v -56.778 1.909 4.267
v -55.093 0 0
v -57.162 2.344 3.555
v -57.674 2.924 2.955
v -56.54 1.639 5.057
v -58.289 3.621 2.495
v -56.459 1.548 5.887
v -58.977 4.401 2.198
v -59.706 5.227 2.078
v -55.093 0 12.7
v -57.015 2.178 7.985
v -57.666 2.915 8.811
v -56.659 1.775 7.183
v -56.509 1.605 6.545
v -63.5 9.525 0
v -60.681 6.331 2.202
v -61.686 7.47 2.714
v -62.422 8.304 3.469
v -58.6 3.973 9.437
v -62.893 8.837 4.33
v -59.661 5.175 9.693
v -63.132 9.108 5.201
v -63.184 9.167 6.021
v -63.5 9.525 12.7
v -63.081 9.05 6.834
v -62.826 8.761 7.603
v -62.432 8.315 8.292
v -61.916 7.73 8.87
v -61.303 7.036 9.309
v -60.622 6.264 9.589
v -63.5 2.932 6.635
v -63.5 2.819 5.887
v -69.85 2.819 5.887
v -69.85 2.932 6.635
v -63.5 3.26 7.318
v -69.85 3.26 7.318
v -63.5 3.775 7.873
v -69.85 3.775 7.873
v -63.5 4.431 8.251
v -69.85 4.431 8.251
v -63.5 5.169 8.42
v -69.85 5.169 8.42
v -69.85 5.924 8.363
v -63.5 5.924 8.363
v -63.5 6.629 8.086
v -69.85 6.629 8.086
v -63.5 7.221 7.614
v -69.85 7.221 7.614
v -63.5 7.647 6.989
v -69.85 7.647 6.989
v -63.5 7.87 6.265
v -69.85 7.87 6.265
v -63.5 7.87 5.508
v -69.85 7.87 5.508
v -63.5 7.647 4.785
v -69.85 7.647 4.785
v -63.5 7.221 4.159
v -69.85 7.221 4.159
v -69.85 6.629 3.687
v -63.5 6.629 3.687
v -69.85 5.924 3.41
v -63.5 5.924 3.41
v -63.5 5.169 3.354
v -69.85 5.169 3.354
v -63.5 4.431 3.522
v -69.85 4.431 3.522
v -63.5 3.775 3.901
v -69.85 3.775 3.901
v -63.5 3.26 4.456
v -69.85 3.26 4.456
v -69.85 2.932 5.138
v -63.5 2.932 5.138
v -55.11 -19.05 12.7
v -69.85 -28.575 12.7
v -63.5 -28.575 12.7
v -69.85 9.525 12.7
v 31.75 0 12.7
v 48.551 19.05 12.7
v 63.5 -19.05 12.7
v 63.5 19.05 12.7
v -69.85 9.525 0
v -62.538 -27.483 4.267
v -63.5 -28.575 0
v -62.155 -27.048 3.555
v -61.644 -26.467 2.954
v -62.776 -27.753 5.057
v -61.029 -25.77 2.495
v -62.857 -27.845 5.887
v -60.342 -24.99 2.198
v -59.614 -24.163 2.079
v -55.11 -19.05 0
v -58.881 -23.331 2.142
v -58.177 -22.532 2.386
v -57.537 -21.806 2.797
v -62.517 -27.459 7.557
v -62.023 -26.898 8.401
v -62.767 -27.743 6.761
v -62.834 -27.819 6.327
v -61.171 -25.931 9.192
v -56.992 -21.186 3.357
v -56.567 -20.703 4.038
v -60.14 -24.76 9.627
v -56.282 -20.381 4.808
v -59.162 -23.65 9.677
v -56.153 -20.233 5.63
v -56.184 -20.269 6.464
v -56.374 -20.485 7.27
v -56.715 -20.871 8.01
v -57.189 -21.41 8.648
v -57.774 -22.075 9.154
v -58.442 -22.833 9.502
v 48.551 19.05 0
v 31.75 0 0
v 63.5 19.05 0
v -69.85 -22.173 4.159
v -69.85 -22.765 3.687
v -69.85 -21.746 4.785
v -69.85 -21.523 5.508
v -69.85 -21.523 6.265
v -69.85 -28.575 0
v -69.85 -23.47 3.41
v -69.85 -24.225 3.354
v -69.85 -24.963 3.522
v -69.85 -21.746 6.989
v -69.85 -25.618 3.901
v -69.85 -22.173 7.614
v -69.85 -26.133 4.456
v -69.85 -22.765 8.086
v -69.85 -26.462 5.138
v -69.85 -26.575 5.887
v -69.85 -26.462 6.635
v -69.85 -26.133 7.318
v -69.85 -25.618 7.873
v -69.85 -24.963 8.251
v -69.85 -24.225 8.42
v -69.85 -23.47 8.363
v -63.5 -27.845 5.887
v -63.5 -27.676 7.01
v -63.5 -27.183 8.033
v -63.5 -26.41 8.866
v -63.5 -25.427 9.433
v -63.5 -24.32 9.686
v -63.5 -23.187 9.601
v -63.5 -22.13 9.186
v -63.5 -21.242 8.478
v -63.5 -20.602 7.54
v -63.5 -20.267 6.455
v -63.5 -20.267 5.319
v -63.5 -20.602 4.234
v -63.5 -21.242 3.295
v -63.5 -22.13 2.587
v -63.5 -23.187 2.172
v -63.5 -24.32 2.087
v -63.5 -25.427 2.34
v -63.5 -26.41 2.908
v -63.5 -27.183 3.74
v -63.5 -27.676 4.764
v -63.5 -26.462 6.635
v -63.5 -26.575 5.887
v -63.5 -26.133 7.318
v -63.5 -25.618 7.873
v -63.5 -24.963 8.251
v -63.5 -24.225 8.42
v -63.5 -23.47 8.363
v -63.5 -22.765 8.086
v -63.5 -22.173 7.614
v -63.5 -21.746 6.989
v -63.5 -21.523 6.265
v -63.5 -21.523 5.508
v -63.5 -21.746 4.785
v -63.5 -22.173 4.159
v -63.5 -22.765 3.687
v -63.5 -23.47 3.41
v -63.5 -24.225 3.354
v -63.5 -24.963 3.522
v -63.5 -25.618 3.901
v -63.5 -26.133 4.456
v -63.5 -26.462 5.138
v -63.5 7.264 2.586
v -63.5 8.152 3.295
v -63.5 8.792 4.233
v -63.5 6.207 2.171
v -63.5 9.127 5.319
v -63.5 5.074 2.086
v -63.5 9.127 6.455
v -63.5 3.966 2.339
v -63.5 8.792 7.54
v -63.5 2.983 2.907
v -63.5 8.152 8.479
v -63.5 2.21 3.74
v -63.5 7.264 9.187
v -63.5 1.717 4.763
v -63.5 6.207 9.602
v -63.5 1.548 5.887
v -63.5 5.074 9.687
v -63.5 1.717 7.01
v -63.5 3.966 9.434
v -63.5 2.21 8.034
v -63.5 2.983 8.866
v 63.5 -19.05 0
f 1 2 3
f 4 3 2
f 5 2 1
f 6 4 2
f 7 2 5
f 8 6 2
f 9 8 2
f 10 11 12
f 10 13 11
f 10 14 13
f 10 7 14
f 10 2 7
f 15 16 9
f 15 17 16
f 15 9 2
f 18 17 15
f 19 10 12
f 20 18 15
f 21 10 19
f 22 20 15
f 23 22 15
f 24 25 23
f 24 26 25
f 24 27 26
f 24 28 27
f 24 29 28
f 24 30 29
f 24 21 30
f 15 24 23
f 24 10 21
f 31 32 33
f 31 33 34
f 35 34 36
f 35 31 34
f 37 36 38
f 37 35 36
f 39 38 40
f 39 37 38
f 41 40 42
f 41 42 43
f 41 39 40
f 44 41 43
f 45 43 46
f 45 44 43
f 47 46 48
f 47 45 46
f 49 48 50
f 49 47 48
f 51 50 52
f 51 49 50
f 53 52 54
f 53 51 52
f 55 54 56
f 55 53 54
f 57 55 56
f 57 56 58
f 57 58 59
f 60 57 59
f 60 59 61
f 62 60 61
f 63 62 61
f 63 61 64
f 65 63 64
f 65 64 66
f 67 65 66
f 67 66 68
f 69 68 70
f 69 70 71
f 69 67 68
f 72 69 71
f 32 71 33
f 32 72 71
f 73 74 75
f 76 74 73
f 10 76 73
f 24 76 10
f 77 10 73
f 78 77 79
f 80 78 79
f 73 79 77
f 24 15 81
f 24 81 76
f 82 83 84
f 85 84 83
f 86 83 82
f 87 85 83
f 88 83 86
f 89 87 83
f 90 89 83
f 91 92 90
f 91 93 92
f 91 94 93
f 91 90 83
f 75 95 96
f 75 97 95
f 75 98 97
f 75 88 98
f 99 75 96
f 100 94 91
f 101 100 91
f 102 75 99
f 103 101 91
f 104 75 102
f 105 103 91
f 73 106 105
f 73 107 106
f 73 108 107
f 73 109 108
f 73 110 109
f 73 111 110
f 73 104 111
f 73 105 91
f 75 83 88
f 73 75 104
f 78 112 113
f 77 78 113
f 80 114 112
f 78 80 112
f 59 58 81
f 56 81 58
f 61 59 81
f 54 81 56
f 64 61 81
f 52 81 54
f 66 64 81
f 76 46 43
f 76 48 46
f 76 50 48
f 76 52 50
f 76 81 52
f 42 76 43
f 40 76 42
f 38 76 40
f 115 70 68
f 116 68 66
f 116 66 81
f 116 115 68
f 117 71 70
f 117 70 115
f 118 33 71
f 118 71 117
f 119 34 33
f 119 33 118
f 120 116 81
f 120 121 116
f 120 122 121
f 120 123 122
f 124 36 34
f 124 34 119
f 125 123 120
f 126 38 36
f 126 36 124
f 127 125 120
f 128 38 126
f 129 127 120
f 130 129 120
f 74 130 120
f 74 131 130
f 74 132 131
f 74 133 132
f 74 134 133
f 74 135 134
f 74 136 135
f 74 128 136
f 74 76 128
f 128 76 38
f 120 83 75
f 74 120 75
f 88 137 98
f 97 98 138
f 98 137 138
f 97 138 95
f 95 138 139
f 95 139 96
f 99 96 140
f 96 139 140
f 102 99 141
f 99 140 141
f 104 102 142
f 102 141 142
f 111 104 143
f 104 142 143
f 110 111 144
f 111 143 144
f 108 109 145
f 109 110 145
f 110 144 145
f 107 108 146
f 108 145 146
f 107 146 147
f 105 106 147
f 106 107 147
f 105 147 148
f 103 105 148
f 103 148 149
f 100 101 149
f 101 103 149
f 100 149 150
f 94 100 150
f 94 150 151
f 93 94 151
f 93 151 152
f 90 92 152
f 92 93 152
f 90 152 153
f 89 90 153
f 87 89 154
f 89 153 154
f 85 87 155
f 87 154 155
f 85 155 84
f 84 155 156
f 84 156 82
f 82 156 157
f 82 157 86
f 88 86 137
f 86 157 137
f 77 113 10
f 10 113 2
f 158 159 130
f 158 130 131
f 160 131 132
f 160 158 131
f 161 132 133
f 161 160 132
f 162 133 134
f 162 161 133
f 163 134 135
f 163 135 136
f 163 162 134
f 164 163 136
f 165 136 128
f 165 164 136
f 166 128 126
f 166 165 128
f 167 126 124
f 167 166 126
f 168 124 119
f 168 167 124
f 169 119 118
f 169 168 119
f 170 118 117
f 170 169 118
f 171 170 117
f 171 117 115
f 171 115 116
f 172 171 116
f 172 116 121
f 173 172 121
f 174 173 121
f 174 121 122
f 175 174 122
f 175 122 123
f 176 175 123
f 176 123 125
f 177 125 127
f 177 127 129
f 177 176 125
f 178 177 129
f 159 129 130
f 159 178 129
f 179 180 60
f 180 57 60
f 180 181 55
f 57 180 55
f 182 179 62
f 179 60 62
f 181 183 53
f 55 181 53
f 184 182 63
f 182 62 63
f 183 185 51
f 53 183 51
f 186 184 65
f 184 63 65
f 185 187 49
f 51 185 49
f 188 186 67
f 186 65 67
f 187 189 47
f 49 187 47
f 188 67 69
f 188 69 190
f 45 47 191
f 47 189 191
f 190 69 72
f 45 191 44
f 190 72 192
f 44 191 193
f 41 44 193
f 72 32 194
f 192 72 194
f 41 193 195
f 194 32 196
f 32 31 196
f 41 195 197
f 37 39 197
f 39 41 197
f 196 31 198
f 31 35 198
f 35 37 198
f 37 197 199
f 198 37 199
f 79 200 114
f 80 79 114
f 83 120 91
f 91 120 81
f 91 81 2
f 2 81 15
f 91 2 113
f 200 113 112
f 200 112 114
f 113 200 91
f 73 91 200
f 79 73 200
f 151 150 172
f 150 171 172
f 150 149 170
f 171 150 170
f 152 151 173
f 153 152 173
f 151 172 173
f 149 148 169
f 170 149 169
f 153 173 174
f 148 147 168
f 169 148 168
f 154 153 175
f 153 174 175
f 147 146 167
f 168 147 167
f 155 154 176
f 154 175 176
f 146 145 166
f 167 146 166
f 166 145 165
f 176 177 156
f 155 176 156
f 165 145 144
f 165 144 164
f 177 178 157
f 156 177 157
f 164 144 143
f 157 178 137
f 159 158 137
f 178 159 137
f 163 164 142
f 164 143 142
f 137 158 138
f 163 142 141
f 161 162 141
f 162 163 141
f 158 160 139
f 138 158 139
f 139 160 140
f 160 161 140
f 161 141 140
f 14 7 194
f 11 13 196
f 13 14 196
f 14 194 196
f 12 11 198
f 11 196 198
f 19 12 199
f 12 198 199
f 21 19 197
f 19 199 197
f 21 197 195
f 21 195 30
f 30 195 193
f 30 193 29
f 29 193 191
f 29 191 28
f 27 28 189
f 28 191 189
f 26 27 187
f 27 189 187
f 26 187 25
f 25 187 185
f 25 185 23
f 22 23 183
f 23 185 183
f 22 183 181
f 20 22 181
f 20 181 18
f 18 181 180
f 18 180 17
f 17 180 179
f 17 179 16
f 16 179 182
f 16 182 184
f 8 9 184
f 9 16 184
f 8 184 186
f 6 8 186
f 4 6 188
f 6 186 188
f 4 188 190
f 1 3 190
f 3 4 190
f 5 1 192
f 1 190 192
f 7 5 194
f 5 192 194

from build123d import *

# Parameters (mm, degrees)
F1_DEPTH  = 12.7
F2_W      = 9.525
F2_H      = 12.7
F2_R      = 2.54
F2_W_2    = 19.05
F3_DEPTH  = 6.35
F4_DEPTH  = 25.4
F6_DEPTH  = 12.7
F7_DEPTH  = 12.7
F8_R      = 3.8109417559
F8_R_2    = 2.54
F9_DEPTH  = 25.4
F10_R     = 3.81
F10_R_2   = 2.54
F11_DEPTH = 25.4


with BuildPart() as f1:
    # F0 (on Top) → F1 (new body)
    with BuildSketch(Plane.XY):
        Polygon((63.5, 19.05), (48.5505208253, 19.05), (31.75, 0), (-63.5, 0), (-63.5, -19.05), (63.5, -19.05), align=None)
    extrude(amount=F1_DEPTH)

    # F2 (on face) → F3 (join)
    with BuildSketch(Plane(origin=(-63.5, 0, 0), x_dir=(0, -1, 0), z_dir=(-1, 0, 0))):
        with Locations((-4.7625, 6.35)):
            Rectangle(F2_W, F2_H)
        with Locations((-5.3587416187, 5.8867353946)):
            Circle(F2_R, mode=Mode.SUBTRACT)
        with Locations((9.525, 6.35)):
            Rectangle(F2_W_2, F2_H)
        with Locations((23.8125, 6.35)):
            Rectangle(F2_W, F2_H)
        with Locations((24.0348111838, 5.8867353946)):
            Circle(F2_R, mode=Mode.SUBTRACT)
    extrude(amount=F3_DEPTH)

    # F2 (on face) → F4 (cut)
    with BuildSketch(Plane(origin=(-63.5, 0, 0), x_dir=(0, -1, 0), z_dir=(-1, 0, 0))):
        with Locations((24.0348111838, 5.8867353946)):
            Circle(F2_R)
    extrude(amount=F4_DEPTH, mode=Mode.SUBTRACT)

    # F5 (on face) → F6 (join)
    with BuildSketch(Plane.XY.offset(12.7)):
        Polygon((-55.0928376615, 0), (-63.5, 9.525), (-63.5, 0), align=None)
    extrude(amount=-F6_DEPTH)

    # F5 (on face) → F7 (join)
    with BuildSketch(Plane.XY.offset(12.7)):
        Polygon((-63.5, -19.05), (-63.5, -28.575), (-55.1101081073, -19.05), align=None)
    extrude(amount=-F7_DEPTH)

    # F8 (on face) → F9 (cut)
    with BuildSketch(Plane(origin=(-63.5, 0, 0), x_dir=(0, -1, 0), z_dir=(-1, 0, 0))):
        with Locations((-5.3587416187, 5.8867353946)):
            Circle(F8_R)
        with Locations((-5.3587416187, 5.8867353946)):
            Circle(F8_R_2, mode=Mode.SUBTRACT)
        with Locations((-5.3587416187, 5.8867353946)):
            Circle(F8_R_2)
    extrude(amount=-F9_DEPTH, mode=Mode.SUBTRACT)

    # F10 (on face) → F11 (cut)
    with BuildSketch(Plane(origin=(-63.5, 0, 0), x_dir=(0, -1, 0), z_dir=(-1, 0, 0))):
        with Locations((24.0348111838, 5.8867353946)):
            Circle(F10_R)
        with Locations((24.0348111838, 5.8867353946)):
            Circle(F10_R_2, mode=Mode.SUBTRACT)
        with Locations((24.0348111838, 5.8867353946)):
            Circle(F10_R_2)
    extrude(amount=-F11_DEPTH, mode=Mode.SUBTRACT)


solid = f1.part
